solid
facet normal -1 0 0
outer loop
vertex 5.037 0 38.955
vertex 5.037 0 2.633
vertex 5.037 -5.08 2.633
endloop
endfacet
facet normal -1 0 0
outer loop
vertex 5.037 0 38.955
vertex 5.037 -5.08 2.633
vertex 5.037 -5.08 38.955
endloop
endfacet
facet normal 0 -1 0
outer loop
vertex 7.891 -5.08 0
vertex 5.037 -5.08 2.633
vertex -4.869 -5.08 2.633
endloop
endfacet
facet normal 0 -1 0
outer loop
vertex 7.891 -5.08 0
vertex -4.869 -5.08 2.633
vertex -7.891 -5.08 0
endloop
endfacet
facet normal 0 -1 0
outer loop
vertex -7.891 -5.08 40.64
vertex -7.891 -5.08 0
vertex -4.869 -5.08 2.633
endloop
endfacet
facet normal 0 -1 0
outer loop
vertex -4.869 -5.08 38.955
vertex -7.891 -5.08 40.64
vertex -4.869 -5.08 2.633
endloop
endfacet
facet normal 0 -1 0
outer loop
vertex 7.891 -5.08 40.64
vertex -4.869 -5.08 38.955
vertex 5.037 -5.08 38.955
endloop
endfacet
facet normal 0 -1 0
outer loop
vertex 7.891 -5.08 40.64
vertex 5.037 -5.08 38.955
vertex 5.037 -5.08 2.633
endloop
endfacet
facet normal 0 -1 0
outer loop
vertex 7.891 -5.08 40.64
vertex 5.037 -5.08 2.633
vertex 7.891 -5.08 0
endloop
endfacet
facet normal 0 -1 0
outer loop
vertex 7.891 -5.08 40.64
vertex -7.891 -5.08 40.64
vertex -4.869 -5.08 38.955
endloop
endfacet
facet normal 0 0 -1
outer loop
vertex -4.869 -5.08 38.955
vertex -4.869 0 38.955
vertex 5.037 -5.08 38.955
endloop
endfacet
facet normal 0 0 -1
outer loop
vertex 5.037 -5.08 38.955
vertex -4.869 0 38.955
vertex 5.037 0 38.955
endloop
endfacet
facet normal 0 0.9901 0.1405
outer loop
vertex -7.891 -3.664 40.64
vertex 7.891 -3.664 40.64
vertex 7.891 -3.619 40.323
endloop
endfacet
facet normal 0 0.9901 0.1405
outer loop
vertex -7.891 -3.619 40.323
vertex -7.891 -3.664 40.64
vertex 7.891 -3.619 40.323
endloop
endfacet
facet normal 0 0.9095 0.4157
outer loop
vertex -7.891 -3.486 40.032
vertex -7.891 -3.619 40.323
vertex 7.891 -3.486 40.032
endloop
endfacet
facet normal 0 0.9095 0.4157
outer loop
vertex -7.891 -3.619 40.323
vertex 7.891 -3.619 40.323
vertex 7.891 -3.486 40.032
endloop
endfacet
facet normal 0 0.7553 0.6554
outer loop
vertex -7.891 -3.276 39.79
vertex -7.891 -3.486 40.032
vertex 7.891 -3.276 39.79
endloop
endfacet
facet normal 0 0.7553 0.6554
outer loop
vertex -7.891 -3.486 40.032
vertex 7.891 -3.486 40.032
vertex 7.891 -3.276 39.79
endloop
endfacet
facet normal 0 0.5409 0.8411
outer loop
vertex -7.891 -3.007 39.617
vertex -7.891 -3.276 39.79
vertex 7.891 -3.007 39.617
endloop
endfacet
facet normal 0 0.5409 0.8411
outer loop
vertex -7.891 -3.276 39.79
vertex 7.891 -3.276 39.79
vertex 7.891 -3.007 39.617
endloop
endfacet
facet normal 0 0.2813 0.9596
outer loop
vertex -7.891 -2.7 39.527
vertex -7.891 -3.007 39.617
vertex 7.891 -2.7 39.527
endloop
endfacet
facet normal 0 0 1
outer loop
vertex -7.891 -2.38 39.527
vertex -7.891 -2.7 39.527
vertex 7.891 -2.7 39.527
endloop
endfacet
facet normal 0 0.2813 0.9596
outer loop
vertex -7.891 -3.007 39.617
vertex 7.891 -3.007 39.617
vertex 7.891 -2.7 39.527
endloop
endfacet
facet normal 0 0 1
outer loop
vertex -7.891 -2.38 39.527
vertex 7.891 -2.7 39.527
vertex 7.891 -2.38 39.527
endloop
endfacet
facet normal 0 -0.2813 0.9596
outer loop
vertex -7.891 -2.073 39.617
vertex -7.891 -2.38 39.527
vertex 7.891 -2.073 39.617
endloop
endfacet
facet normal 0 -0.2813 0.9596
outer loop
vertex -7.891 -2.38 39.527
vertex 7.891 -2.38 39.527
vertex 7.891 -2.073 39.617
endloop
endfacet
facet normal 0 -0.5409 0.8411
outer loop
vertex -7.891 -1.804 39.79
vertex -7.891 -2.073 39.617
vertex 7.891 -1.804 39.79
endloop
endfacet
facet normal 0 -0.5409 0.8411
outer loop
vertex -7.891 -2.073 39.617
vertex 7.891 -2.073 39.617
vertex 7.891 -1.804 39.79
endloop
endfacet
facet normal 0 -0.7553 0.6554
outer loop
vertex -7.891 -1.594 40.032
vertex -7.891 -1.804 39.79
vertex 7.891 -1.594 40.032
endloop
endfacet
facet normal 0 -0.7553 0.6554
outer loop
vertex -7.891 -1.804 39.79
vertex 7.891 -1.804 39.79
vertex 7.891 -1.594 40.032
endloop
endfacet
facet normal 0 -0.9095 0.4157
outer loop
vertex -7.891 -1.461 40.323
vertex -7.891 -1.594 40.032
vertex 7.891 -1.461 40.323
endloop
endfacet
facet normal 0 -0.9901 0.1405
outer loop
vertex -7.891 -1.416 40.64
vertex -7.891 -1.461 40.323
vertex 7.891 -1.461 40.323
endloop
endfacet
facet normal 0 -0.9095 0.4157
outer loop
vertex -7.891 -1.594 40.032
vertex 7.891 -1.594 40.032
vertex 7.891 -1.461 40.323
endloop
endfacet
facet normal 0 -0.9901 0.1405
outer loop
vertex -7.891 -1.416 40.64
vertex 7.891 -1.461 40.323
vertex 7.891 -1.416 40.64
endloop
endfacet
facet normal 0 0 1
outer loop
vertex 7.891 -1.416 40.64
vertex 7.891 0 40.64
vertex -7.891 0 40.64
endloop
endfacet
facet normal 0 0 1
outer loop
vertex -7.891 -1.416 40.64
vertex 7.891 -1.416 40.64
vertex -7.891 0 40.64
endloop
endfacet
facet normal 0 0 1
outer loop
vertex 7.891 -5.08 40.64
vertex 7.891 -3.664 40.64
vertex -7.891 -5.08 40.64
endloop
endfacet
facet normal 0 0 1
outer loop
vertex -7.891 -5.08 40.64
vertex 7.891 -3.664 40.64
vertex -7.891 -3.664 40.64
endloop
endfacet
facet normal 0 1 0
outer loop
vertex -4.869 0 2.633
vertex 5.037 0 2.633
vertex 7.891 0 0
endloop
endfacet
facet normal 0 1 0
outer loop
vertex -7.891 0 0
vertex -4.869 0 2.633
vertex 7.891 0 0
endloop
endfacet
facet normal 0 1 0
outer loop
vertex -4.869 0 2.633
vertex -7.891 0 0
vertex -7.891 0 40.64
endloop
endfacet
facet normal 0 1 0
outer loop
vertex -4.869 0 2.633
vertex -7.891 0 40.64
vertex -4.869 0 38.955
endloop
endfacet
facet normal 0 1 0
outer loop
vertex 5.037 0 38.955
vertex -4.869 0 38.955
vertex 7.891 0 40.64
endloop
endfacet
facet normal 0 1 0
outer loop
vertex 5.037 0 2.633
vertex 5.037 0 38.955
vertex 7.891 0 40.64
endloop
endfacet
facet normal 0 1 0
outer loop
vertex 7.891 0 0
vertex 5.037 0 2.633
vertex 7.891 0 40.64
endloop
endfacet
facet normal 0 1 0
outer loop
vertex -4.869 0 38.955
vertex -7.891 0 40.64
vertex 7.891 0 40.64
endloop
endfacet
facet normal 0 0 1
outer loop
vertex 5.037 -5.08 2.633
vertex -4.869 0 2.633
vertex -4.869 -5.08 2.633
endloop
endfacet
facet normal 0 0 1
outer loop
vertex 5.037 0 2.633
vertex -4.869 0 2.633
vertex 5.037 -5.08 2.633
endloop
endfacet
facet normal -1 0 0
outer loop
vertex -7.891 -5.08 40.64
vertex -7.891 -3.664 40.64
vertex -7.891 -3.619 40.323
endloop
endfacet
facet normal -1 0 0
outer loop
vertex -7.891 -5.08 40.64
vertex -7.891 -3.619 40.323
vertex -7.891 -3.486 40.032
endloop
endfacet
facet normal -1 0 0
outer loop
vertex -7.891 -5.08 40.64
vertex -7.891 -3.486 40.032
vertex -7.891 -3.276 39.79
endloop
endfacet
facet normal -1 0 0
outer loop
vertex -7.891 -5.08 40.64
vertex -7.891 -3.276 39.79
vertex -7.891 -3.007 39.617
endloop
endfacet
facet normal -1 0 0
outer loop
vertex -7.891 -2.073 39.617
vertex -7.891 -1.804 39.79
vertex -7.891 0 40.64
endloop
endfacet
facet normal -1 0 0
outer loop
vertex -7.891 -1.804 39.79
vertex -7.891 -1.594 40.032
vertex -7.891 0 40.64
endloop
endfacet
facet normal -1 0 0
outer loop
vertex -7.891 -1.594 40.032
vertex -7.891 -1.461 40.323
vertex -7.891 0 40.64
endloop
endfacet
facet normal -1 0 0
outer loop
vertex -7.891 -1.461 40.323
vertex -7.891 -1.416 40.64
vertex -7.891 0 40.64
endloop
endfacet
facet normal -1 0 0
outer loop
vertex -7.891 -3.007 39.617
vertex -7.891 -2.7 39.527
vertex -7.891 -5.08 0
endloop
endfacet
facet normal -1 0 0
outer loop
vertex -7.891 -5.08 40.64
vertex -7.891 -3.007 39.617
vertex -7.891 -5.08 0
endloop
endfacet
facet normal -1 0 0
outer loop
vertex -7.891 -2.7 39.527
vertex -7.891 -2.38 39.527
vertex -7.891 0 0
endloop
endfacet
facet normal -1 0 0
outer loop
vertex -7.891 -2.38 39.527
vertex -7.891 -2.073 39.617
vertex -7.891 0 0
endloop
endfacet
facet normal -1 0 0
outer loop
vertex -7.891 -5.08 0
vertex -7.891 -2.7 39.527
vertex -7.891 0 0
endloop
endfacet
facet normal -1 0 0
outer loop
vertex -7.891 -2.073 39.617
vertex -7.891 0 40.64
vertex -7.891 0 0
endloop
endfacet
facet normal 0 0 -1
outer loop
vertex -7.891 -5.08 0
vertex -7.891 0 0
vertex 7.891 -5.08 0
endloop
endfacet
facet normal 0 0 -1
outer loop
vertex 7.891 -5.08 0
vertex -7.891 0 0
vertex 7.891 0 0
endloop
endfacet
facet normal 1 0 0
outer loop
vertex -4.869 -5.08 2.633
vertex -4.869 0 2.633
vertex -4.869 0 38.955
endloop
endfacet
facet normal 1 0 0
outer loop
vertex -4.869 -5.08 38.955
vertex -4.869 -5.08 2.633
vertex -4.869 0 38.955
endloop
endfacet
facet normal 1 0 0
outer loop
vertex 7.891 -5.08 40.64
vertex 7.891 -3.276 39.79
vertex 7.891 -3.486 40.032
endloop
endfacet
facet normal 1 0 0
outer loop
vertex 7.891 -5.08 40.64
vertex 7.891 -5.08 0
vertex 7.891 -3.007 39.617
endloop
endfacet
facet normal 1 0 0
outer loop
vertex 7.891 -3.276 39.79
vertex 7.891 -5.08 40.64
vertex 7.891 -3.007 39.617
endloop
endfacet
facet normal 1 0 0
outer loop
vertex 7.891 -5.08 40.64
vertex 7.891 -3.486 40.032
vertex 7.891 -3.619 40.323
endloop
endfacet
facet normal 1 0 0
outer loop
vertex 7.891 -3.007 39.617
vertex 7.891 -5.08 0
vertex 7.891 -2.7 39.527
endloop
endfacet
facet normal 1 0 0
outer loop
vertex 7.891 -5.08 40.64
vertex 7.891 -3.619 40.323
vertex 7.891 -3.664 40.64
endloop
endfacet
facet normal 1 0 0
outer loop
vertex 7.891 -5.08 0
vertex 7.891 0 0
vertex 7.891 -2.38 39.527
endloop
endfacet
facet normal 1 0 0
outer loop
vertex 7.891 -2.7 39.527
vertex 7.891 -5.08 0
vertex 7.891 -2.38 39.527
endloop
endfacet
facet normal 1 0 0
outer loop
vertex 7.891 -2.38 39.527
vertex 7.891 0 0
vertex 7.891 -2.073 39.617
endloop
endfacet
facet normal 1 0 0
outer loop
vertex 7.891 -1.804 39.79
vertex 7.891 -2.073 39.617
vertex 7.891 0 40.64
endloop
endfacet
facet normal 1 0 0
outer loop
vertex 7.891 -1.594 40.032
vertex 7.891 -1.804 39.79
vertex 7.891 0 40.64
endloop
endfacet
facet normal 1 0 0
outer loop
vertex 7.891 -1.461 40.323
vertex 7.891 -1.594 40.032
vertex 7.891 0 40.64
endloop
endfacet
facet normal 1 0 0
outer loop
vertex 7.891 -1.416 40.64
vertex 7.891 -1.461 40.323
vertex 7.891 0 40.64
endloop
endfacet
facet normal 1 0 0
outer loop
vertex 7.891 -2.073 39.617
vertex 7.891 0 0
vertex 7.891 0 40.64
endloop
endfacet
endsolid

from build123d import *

# Parameters (mm, degrees)
F0_W     = 9.906
F0_H     = 36.322
F1_DEPTH = 5.08
F2_R     = 1.124354
F3_DEPTH = 25.4


with BuildPart() as f1:
    # F0 (on Front) → F1 (new body)
    with BuildSketch(Plane.XZ):
        Polygon((-7.89122, 0), (-4.869051, 0), (0, 0), (7.89122, 0), (7.89122, 40.64), (-7.89122, 40.64), align=None)
        with Locations((0.083949, 20.794085)):
            Rectangle(F0_W, F0_H, mode=Mode.SUBTRACT)
    extrude(amount=F1_DEPTH)

    # F2 (on face) → F3 (cut)
    with BuildSketch(Plane.YZ.offset(7.89122)):
        with Locations((-2.54, 40.64)):
            Circle(F2_R)
    extrude(amount=-F3_DEPTH, mode=Mode.SUBTRACT)


solid = f1.part
